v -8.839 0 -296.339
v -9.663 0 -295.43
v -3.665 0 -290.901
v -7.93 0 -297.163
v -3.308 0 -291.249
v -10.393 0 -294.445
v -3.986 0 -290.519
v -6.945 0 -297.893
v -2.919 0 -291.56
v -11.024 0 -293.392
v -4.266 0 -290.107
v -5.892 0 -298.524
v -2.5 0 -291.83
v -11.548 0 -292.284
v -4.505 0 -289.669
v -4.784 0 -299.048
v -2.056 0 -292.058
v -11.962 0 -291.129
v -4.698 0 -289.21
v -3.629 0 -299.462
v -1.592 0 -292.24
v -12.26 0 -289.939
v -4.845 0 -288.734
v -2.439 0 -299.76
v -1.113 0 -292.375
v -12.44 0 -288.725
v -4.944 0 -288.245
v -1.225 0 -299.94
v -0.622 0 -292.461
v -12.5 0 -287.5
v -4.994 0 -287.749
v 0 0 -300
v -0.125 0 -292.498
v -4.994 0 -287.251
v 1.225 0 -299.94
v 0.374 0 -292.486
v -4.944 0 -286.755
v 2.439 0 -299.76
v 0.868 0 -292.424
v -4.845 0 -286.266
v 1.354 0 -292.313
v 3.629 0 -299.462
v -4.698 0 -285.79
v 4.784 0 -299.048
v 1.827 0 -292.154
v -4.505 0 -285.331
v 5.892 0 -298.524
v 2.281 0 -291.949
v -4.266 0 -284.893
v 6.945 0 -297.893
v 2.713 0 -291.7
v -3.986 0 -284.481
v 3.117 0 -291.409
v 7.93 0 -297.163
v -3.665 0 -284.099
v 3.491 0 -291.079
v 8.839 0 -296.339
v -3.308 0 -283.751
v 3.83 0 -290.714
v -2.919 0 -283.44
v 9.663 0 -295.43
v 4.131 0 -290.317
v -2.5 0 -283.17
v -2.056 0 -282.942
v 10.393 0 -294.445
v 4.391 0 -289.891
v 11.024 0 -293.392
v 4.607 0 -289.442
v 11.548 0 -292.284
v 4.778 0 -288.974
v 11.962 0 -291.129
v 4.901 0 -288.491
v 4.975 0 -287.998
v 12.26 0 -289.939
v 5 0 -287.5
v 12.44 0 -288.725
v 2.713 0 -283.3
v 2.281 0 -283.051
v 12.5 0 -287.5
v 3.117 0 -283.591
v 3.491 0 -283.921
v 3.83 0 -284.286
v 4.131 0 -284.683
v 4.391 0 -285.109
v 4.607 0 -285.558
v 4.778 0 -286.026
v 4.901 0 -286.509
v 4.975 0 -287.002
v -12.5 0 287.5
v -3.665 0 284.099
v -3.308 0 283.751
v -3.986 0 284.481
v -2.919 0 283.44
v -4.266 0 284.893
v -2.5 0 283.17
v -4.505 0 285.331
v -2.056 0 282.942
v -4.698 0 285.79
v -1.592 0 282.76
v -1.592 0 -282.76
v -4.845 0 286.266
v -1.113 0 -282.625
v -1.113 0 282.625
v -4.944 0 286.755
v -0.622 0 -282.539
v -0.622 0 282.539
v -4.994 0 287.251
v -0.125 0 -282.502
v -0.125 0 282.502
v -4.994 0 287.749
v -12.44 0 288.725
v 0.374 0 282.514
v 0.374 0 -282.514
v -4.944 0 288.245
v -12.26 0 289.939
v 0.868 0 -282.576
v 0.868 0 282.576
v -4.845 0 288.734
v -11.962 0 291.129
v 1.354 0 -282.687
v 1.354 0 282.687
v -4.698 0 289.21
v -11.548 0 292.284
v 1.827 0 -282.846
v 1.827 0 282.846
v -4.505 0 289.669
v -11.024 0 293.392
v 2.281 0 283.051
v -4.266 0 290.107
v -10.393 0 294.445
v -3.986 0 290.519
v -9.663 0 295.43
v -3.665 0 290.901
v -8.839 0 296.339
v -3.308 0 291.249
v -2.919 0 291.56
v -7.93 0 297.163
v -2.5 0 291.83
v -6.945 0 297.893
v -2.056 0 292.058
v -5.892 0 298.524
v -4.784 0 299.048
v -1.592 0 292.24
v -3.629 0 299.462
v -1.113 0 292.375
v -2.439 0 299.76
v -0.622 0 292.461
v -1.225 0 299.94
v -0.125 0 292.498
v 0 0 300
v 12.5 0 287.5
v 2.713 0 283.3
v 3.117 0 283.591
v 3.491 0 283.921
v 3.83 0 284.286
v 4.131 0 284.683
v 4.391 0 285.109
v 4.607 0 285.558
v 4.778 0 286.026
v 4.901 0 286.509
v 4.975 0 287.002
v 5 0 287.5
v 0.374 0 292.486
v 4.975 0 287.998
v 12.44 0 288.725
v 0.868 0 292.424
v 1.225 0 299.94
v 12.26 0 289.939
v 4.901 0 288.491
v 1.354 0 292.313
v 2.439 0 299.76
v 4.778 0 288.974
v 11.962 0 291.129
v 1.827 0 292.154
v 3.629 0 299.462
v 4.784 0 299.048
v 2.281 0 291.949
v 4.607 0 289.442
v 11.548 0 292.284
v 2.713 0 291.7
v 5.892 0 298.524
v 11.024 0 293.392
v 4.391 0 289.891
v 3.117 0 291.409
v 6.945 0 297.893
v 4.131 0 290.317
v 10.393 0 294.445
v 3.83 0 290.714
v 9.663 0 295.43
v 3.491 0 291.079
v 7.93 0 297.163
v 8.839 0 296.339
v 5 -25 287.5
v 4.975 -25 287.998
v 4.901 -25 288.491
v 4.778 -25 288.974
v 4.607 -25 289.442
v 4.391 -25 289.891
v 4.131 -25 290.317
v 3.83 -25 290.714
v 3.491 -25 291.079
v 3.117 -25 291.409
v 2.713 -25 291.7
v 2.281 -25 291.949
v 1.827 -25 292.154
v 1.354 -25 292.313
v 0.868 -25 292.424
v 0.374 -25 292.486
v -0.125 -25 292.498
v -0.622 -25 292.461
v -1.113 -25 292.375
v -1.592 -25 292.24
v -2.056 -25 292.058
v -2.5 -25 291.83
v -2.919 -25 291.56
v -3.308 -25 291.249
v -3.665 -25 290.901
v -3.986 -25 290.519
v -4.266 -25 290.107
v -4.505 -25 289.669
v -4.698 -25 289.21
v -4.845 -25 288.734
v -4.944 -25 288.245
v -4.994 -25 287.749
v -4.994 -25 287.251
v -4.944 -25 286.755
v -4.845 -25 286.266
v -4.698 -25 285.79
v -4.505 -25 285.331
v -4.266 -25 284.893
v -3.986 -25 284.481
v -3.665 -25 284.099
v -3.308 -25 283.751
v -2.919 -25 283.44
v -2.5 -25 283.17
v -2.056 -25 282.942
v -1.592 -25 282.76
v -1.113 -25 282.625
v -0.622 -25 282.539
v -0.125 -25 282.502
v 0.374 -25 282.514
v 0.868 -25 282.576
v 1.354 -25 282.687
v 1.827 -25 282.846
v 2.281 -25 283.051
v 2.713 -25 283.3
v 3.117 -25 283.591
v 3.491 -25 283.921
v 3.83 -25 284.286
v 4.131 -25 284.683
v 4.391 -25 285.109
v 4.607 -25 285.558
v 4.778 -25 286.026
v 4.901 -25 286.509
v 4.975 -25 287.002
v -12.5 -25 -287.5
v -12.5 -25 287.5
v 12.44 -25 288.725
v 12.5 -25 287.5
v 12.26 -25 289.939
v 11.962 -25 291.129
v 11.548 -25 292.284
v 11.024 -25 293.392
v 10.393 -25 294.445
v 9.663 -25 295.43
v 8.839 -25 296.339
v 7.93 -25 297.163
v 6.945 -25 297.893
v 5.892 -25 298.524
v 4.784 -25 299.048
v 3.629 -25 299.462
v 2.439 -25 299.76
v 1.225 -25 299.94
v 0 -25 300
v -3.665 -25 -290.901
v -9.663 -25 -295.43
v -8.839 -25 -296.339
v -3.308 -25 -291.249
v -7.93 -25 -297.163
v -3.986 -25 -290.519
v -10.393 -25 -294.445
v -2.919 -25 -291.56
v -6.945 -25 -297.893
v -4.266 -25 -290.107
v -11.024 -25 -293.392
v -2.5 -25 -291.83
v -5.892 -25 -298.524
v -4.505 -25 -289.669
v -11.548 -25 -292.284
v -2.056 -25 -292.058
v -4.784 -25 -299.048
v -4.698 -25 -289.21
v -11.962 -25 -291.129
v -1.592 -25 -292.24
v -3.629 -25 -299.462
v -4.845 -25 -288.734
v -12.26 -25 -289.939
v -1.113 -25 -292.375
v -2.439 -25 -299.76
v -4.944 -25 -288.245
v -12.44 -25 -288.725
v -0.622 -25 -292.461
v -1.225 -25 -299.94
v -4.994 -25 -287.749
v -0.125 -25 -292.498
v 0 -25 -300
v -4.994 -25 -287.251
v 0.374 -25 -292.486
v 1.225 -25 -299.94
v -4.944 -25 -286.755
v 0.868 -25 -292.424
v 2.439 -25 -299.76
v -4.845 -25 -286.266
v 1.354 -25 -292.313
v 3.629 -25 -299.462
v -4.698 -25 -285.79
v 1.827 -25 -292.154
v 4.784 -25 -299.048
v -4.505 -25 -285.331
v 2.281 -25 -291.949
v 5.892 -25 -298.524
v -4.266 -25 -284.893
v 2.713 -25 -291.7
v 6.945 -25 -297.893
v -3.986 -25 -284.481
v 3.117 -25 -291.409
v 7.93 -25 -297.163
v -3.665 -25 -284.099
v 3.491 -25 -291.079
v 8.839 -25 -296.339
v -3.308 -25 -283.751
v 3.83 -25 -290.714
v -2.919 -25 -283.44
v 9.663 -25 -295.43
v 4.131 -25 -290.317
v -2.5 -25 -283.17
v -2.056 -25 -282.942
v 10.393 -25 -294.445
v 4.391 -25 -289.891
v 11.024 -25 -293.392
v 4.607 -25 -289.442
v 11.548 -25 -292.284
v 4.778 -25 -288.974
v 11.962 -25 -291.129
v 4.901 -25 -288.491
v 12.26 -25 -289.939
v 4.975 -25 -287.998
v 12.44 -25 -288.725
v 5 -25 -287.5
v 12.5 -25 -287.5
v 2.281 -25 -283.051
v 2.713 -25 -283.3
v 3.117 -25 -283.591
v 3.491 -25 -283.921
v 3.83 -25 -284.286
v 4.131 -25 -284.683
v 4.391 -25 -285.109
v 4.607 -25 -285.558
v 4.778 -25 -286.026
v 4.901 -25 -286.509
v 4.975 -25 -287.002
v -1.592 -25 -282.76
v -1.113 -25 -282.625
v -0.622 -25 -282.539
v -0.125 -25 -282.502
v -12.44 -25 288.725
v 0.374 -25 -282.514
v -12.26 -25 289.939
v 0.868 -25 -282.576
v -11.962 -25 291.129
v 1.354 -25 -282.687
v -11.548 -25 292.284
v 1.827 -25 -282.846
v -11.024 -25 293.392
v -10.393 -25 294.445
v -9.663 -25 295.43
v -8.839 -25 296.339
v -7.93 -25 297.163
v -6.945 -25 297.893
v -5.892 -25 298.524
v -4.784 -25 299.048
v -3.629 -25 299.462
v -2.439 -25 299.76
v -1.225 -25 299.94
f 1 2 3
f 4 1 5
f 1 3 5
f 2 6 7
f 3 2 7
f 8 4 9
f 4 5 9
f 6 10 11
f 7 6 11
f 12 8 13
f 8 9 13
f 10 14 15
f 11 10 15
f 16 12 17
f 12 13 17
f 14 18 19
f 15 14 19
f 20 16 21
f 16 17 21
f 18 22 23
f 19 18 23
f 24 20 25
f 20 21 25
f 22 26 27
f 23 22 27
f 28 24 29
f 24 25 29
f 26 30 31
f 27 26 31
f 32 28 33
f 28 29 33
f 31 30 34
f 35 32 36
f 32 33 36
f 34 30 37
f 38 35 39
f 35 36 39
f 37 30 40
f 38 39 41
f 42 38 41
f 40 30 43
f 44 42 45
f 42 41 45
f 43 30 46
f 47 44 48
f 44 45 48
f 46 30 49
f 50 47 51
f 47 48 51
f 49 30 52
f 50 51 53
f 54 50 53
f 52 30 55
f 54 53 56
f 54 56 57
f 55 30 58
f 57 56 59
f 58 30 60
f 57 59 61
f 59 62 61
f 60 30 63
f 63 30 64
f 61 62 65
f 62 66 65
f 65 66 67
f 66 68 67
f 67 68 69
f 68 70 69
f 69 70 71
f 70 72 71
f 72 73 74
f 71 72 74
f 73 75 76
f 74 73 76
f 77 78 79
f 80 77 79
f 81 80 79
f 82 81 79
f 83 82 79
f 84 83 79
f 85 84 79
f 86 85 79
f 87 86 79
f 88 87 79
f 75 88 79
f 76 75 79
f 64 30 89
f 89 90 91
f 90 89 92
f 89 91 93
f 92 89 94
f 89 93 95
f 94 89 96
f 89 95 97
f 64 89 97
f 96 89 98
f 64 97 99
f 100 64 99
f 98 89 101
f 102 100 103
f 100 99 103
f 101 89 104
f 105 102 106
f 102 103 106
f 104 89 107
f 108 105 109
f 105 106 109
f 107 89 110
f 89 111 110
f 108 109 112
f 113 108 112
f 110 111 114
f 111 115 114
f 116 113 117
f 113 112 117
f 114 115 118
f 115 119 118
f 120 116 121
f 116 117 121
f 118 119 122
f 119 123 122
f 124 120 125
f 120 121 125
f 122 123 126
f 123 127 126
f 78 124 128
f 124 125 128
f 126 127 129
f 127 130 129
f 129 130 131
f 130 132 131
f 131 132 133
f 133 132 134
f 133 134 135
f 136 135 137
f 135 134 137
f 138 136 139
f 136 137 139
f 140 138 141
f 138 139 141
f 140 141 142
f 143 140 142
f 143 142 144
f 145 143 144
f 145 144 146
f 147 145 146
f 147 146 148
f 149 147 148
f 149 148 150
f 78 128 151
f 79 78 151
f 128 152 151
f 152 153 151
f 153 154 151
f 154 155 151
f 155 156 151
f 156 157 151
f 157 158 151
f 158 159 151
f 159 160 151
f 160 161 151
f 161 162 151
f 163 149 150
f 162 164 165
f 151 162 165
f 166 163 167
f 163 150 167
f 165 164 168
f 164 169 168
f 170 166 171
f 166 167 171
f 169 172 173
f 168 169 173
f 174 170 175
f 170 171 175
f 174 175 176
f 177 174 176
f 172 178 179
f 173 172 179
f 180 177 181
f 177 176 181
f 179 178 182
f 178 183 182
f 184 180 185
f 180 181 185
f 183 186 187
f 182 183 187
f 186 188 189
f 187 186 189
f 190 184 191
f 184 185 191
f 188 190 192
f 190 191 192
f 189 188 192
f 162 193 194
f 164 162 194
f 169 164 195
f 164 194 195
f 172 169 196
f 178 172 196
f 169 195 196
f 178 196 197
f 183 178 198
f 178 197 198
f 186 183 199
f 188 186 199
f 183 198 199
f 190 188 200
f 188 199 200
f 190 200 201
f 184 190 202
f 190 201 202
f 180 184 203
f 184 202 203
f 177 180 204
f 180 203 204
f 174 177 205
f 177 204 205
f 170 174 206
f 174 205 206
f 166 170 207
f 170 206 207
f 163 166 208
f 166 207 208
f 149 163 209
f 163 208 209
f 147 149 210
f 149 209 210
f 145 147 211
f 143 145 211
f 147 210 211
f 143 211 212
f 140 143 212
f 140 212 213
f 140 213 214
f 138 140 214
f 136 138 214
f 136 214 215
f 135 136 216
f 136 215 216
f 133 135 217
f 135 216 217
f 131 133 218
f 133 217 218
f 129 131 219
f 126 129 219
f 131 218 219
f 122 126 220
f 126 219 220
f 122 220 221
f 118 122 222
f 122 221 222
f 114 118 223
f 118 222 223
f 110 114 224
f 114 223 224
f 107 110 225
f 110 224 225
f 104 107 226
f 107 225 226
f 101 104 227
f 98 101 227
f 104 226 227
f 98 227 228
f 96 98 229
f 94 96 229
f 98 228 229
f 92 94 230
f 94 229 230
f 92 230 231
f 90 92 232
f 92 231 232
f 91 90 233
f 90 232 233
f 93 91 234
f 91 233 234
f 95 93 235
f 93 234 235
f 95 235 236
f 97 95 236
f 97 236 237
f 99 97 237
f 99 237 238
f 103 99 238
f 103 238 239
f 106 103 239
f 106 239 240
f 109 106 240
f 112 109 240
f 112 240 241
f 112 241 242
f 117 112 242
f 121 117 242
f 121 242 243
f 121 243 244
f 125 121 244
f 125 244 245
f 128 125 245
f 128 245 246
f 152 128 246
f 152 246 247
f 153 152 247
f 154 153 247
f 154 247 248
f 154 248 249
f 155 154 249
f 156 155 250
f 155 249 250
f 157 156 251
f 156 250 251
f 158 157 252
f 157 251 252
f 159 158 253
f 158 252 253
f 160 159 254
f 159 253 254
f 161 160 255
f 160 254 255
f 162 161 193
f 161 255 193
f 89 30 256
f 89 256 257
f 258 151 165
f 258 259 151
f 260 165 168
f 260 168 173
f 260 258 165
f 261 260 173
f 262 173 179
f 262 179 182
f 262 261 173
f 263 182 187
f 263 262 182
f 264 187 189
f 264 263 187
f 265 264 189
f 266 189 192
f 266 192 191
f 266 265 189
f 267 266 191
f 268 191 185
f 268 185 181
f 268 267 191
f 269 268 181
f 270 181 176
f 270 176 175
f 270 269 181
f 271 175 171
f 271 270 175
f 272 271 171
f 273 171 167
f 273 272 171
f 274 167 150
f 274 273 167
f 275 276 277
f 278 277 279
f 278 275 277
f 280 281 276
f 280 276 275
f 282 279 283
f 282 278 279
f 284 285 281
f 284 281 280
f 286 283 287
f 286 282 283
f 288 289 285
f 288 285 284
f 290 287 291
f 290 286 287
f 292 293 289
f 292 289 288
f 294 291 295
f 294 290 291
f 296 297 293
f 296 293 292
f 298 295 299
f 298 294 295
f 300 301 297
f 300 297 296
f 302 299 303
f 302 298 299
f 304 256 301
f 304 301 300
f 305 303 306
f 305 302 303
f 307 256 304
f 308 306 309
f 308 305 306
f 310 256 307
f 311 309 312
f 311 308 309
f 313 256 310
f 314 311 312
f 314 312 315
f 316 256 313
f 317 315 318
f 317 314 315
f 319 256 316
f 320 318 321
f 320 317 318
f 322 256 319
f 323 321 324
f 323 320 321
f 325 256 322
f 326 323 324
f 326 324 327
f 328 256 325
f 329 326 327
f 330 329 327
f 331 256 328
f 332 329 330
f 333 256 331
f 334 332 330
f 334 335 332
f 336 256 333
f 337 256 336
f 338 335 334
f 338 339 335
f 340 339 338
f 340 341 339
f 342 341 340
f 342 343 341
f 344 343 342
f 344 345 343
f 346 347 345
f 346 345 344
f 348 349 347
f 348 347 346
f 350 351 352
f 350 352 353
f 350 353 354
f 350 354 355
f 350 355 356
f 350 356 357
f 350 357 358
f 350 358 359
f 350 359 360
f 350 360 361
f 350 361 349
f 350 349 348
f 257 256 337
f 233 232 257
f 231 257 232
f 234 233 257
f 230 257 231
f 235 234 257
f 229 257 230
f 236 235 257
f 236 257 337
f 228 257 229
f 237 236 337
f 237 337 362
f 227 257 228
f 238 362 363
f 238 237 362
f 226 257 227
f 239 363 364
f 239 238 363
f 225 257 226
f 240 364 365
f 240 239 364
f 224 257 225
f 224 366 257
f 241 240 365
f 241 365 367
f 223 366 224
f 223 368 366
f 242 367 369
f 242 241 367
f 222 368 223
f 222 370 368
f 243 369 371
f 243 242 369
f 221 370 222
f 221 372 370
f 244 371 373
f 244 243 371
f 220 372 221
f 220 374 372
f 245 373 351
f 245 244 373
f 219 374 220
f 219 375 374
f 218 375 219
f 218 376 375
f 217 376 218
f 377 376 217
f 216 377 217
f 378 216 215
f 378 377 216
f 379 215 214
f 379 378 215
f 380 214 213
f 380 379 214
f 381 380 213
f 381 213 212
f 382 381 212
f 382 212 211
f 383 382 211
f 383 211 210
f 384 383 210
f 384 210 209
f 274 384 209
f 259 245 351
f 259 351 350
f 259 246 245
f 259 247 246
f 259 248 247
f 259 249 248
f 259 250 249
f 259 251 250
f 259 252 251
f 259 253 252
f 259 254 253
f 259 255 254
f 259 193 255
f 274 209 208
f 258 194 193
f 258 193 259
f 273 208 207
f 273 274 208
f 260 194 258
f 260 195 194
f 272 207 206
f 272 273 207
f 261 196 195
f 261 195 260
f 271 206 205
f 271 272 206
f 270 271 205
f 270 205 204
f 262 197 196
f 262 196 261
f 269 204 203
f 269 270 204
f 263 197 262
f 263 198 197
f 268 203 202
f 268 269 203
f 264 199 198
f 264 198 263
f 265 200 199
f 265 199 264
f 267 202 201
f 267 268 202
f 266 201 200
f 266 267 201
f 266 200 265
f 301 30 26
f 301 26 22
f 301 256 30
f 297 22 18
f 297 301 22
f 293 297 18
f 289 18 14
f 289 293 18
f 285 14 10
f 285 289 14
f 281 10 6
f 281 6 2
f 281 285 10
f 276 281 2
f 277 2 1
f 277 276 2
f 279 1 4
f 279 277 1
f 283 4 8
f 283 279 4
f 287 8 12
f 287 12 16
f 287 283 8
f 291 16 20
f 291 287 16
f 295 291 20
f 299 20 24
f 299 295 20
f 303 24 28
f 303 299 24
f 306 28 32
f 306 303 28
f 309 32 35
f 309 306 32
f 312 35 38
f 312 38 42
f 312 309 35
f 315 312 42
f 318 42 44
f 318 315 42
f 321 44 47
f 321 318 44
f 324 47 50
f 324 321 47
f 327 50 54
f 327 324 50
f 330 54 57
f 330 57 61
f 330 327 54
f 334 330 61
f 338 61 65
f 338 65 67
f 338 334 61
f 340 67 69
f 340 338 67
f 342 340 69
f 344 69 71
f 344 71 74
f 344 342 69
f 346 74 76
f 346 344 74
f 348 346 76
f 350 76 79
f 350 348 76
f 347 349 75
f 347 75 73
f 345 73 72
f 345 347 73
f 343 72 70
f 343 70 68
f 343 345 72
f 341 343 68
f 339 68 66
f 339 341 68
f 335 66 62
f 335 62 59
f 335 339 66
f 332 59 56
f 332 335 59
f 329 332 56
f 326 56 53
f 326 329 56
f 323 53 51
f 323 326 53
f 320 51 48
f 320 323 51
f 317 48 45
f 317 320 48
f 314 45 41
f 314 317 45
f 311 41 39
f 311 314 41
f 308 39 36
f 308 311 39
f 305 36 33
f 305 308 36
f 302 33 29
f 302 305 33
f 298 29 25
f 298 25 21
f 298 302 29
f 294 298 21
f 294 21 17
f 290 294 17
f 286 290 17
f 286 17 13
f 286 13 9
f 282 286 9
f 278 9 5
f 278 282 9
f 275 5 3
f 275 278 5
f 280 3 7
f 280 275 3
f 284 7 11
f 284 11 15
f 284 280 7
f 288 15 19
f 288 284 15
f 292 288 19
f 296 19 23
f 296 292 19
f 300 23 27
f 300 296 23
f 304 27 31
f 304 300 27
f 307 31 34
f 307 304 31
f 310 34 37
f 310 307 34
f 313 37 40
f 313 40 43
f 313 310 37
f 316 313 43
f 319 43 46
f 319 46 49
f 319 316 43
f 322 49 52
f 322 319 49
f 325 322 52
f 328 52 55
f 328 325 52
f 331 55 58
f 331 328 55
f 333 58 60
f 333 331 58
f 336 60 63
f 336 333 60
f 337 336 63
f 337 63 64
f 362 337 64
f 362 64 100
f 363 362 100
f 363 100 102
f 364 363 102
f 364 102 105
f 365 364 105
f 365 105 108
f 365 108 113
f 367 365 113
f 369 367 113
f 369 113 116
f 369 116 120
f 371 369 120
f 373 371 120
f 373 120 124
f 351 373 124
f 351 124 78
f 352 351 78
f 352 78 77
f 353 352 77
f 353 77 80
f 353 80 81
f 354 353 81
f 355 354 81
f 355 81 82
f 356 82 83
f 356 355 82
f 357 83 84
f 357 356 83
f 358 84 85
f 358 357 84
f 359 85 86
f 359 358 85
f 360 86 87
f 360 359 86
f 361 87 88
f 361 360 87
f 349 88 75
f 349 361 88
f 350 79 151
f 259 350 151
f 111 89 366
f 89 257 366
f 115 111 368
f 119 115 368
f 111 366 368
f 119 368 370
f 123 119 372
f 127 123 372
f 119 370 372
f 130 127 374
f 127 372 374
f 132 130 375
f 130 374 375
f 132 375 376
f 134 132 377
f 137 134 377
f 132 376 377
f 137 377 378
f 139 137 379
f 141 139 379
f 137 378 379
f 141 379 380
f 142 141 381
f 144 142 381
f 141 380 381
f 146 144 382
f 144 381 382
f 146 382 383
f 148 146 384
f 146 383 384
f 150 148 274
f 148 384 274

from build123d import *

# Parameters (mm, degrees)
F0_W     = 25
F0_H     = 600
F1_DEPTH = 25
F2_R     = 12.49999
F3_R     = 12.49999
F4_R     = 5
F5_DEPTH = 25


# Not quite as in the source:
# - a fillet or chamfer is up to 0.001 mm smaller than in the source, because OpenCascade refuses the exact size
# - a pattern or mirror of a feature is missing from the dataset's text; its kind, count and spacing are read off the source's solid


with BuildPart() as f1:
    # F0 (on Front) → F1 (new body)
    with BuildSketch(Plane.XZ):
        Rectangle(F0_W, F0_H)
    extrude(amount=F1_DEPTH)

    # F2 (radius 12.5 in the source; OpenCascade refuses exactly that, so slightly less here)
    f2_edges = [f1.edges().sort_by_distance(p)[0] for p in [
        (-12.5, -12.5, 300),
        (12.5, -12.5, 300),
    ]]
    fillet(f2_edges, radius=F2_R)

    # F3 (radius 12.5 in the source; OpenCascade refuses exactly that, so slightly less here)
    f3_edges = [f1.edges().sort_by_distance(p)[0] for p in [
        (-12.5, -12.5, -300),
        (12.5, -12.5, -300),
    ]]
    fillet(f3_edges, radius=F3_R)

    # F4 (on face) → F5 (cut)
    with BuildSketch(Plane.XZ.offset(25)):
        with Locations((0, 287.5)):
            Circle(F4_R)
    f5 = extrude(amount=-F5_DEPTH, mode=Mode.SUBTRACT)

    # F5_copies: F5 across plane
    add(f5.mirror(Plane(origin=(0, 0, 0), x_dir=(-1, 0, 0), z_dir=(0, 0, -1))), mode=Mode.SUBTRACT)


solid = f1.part
